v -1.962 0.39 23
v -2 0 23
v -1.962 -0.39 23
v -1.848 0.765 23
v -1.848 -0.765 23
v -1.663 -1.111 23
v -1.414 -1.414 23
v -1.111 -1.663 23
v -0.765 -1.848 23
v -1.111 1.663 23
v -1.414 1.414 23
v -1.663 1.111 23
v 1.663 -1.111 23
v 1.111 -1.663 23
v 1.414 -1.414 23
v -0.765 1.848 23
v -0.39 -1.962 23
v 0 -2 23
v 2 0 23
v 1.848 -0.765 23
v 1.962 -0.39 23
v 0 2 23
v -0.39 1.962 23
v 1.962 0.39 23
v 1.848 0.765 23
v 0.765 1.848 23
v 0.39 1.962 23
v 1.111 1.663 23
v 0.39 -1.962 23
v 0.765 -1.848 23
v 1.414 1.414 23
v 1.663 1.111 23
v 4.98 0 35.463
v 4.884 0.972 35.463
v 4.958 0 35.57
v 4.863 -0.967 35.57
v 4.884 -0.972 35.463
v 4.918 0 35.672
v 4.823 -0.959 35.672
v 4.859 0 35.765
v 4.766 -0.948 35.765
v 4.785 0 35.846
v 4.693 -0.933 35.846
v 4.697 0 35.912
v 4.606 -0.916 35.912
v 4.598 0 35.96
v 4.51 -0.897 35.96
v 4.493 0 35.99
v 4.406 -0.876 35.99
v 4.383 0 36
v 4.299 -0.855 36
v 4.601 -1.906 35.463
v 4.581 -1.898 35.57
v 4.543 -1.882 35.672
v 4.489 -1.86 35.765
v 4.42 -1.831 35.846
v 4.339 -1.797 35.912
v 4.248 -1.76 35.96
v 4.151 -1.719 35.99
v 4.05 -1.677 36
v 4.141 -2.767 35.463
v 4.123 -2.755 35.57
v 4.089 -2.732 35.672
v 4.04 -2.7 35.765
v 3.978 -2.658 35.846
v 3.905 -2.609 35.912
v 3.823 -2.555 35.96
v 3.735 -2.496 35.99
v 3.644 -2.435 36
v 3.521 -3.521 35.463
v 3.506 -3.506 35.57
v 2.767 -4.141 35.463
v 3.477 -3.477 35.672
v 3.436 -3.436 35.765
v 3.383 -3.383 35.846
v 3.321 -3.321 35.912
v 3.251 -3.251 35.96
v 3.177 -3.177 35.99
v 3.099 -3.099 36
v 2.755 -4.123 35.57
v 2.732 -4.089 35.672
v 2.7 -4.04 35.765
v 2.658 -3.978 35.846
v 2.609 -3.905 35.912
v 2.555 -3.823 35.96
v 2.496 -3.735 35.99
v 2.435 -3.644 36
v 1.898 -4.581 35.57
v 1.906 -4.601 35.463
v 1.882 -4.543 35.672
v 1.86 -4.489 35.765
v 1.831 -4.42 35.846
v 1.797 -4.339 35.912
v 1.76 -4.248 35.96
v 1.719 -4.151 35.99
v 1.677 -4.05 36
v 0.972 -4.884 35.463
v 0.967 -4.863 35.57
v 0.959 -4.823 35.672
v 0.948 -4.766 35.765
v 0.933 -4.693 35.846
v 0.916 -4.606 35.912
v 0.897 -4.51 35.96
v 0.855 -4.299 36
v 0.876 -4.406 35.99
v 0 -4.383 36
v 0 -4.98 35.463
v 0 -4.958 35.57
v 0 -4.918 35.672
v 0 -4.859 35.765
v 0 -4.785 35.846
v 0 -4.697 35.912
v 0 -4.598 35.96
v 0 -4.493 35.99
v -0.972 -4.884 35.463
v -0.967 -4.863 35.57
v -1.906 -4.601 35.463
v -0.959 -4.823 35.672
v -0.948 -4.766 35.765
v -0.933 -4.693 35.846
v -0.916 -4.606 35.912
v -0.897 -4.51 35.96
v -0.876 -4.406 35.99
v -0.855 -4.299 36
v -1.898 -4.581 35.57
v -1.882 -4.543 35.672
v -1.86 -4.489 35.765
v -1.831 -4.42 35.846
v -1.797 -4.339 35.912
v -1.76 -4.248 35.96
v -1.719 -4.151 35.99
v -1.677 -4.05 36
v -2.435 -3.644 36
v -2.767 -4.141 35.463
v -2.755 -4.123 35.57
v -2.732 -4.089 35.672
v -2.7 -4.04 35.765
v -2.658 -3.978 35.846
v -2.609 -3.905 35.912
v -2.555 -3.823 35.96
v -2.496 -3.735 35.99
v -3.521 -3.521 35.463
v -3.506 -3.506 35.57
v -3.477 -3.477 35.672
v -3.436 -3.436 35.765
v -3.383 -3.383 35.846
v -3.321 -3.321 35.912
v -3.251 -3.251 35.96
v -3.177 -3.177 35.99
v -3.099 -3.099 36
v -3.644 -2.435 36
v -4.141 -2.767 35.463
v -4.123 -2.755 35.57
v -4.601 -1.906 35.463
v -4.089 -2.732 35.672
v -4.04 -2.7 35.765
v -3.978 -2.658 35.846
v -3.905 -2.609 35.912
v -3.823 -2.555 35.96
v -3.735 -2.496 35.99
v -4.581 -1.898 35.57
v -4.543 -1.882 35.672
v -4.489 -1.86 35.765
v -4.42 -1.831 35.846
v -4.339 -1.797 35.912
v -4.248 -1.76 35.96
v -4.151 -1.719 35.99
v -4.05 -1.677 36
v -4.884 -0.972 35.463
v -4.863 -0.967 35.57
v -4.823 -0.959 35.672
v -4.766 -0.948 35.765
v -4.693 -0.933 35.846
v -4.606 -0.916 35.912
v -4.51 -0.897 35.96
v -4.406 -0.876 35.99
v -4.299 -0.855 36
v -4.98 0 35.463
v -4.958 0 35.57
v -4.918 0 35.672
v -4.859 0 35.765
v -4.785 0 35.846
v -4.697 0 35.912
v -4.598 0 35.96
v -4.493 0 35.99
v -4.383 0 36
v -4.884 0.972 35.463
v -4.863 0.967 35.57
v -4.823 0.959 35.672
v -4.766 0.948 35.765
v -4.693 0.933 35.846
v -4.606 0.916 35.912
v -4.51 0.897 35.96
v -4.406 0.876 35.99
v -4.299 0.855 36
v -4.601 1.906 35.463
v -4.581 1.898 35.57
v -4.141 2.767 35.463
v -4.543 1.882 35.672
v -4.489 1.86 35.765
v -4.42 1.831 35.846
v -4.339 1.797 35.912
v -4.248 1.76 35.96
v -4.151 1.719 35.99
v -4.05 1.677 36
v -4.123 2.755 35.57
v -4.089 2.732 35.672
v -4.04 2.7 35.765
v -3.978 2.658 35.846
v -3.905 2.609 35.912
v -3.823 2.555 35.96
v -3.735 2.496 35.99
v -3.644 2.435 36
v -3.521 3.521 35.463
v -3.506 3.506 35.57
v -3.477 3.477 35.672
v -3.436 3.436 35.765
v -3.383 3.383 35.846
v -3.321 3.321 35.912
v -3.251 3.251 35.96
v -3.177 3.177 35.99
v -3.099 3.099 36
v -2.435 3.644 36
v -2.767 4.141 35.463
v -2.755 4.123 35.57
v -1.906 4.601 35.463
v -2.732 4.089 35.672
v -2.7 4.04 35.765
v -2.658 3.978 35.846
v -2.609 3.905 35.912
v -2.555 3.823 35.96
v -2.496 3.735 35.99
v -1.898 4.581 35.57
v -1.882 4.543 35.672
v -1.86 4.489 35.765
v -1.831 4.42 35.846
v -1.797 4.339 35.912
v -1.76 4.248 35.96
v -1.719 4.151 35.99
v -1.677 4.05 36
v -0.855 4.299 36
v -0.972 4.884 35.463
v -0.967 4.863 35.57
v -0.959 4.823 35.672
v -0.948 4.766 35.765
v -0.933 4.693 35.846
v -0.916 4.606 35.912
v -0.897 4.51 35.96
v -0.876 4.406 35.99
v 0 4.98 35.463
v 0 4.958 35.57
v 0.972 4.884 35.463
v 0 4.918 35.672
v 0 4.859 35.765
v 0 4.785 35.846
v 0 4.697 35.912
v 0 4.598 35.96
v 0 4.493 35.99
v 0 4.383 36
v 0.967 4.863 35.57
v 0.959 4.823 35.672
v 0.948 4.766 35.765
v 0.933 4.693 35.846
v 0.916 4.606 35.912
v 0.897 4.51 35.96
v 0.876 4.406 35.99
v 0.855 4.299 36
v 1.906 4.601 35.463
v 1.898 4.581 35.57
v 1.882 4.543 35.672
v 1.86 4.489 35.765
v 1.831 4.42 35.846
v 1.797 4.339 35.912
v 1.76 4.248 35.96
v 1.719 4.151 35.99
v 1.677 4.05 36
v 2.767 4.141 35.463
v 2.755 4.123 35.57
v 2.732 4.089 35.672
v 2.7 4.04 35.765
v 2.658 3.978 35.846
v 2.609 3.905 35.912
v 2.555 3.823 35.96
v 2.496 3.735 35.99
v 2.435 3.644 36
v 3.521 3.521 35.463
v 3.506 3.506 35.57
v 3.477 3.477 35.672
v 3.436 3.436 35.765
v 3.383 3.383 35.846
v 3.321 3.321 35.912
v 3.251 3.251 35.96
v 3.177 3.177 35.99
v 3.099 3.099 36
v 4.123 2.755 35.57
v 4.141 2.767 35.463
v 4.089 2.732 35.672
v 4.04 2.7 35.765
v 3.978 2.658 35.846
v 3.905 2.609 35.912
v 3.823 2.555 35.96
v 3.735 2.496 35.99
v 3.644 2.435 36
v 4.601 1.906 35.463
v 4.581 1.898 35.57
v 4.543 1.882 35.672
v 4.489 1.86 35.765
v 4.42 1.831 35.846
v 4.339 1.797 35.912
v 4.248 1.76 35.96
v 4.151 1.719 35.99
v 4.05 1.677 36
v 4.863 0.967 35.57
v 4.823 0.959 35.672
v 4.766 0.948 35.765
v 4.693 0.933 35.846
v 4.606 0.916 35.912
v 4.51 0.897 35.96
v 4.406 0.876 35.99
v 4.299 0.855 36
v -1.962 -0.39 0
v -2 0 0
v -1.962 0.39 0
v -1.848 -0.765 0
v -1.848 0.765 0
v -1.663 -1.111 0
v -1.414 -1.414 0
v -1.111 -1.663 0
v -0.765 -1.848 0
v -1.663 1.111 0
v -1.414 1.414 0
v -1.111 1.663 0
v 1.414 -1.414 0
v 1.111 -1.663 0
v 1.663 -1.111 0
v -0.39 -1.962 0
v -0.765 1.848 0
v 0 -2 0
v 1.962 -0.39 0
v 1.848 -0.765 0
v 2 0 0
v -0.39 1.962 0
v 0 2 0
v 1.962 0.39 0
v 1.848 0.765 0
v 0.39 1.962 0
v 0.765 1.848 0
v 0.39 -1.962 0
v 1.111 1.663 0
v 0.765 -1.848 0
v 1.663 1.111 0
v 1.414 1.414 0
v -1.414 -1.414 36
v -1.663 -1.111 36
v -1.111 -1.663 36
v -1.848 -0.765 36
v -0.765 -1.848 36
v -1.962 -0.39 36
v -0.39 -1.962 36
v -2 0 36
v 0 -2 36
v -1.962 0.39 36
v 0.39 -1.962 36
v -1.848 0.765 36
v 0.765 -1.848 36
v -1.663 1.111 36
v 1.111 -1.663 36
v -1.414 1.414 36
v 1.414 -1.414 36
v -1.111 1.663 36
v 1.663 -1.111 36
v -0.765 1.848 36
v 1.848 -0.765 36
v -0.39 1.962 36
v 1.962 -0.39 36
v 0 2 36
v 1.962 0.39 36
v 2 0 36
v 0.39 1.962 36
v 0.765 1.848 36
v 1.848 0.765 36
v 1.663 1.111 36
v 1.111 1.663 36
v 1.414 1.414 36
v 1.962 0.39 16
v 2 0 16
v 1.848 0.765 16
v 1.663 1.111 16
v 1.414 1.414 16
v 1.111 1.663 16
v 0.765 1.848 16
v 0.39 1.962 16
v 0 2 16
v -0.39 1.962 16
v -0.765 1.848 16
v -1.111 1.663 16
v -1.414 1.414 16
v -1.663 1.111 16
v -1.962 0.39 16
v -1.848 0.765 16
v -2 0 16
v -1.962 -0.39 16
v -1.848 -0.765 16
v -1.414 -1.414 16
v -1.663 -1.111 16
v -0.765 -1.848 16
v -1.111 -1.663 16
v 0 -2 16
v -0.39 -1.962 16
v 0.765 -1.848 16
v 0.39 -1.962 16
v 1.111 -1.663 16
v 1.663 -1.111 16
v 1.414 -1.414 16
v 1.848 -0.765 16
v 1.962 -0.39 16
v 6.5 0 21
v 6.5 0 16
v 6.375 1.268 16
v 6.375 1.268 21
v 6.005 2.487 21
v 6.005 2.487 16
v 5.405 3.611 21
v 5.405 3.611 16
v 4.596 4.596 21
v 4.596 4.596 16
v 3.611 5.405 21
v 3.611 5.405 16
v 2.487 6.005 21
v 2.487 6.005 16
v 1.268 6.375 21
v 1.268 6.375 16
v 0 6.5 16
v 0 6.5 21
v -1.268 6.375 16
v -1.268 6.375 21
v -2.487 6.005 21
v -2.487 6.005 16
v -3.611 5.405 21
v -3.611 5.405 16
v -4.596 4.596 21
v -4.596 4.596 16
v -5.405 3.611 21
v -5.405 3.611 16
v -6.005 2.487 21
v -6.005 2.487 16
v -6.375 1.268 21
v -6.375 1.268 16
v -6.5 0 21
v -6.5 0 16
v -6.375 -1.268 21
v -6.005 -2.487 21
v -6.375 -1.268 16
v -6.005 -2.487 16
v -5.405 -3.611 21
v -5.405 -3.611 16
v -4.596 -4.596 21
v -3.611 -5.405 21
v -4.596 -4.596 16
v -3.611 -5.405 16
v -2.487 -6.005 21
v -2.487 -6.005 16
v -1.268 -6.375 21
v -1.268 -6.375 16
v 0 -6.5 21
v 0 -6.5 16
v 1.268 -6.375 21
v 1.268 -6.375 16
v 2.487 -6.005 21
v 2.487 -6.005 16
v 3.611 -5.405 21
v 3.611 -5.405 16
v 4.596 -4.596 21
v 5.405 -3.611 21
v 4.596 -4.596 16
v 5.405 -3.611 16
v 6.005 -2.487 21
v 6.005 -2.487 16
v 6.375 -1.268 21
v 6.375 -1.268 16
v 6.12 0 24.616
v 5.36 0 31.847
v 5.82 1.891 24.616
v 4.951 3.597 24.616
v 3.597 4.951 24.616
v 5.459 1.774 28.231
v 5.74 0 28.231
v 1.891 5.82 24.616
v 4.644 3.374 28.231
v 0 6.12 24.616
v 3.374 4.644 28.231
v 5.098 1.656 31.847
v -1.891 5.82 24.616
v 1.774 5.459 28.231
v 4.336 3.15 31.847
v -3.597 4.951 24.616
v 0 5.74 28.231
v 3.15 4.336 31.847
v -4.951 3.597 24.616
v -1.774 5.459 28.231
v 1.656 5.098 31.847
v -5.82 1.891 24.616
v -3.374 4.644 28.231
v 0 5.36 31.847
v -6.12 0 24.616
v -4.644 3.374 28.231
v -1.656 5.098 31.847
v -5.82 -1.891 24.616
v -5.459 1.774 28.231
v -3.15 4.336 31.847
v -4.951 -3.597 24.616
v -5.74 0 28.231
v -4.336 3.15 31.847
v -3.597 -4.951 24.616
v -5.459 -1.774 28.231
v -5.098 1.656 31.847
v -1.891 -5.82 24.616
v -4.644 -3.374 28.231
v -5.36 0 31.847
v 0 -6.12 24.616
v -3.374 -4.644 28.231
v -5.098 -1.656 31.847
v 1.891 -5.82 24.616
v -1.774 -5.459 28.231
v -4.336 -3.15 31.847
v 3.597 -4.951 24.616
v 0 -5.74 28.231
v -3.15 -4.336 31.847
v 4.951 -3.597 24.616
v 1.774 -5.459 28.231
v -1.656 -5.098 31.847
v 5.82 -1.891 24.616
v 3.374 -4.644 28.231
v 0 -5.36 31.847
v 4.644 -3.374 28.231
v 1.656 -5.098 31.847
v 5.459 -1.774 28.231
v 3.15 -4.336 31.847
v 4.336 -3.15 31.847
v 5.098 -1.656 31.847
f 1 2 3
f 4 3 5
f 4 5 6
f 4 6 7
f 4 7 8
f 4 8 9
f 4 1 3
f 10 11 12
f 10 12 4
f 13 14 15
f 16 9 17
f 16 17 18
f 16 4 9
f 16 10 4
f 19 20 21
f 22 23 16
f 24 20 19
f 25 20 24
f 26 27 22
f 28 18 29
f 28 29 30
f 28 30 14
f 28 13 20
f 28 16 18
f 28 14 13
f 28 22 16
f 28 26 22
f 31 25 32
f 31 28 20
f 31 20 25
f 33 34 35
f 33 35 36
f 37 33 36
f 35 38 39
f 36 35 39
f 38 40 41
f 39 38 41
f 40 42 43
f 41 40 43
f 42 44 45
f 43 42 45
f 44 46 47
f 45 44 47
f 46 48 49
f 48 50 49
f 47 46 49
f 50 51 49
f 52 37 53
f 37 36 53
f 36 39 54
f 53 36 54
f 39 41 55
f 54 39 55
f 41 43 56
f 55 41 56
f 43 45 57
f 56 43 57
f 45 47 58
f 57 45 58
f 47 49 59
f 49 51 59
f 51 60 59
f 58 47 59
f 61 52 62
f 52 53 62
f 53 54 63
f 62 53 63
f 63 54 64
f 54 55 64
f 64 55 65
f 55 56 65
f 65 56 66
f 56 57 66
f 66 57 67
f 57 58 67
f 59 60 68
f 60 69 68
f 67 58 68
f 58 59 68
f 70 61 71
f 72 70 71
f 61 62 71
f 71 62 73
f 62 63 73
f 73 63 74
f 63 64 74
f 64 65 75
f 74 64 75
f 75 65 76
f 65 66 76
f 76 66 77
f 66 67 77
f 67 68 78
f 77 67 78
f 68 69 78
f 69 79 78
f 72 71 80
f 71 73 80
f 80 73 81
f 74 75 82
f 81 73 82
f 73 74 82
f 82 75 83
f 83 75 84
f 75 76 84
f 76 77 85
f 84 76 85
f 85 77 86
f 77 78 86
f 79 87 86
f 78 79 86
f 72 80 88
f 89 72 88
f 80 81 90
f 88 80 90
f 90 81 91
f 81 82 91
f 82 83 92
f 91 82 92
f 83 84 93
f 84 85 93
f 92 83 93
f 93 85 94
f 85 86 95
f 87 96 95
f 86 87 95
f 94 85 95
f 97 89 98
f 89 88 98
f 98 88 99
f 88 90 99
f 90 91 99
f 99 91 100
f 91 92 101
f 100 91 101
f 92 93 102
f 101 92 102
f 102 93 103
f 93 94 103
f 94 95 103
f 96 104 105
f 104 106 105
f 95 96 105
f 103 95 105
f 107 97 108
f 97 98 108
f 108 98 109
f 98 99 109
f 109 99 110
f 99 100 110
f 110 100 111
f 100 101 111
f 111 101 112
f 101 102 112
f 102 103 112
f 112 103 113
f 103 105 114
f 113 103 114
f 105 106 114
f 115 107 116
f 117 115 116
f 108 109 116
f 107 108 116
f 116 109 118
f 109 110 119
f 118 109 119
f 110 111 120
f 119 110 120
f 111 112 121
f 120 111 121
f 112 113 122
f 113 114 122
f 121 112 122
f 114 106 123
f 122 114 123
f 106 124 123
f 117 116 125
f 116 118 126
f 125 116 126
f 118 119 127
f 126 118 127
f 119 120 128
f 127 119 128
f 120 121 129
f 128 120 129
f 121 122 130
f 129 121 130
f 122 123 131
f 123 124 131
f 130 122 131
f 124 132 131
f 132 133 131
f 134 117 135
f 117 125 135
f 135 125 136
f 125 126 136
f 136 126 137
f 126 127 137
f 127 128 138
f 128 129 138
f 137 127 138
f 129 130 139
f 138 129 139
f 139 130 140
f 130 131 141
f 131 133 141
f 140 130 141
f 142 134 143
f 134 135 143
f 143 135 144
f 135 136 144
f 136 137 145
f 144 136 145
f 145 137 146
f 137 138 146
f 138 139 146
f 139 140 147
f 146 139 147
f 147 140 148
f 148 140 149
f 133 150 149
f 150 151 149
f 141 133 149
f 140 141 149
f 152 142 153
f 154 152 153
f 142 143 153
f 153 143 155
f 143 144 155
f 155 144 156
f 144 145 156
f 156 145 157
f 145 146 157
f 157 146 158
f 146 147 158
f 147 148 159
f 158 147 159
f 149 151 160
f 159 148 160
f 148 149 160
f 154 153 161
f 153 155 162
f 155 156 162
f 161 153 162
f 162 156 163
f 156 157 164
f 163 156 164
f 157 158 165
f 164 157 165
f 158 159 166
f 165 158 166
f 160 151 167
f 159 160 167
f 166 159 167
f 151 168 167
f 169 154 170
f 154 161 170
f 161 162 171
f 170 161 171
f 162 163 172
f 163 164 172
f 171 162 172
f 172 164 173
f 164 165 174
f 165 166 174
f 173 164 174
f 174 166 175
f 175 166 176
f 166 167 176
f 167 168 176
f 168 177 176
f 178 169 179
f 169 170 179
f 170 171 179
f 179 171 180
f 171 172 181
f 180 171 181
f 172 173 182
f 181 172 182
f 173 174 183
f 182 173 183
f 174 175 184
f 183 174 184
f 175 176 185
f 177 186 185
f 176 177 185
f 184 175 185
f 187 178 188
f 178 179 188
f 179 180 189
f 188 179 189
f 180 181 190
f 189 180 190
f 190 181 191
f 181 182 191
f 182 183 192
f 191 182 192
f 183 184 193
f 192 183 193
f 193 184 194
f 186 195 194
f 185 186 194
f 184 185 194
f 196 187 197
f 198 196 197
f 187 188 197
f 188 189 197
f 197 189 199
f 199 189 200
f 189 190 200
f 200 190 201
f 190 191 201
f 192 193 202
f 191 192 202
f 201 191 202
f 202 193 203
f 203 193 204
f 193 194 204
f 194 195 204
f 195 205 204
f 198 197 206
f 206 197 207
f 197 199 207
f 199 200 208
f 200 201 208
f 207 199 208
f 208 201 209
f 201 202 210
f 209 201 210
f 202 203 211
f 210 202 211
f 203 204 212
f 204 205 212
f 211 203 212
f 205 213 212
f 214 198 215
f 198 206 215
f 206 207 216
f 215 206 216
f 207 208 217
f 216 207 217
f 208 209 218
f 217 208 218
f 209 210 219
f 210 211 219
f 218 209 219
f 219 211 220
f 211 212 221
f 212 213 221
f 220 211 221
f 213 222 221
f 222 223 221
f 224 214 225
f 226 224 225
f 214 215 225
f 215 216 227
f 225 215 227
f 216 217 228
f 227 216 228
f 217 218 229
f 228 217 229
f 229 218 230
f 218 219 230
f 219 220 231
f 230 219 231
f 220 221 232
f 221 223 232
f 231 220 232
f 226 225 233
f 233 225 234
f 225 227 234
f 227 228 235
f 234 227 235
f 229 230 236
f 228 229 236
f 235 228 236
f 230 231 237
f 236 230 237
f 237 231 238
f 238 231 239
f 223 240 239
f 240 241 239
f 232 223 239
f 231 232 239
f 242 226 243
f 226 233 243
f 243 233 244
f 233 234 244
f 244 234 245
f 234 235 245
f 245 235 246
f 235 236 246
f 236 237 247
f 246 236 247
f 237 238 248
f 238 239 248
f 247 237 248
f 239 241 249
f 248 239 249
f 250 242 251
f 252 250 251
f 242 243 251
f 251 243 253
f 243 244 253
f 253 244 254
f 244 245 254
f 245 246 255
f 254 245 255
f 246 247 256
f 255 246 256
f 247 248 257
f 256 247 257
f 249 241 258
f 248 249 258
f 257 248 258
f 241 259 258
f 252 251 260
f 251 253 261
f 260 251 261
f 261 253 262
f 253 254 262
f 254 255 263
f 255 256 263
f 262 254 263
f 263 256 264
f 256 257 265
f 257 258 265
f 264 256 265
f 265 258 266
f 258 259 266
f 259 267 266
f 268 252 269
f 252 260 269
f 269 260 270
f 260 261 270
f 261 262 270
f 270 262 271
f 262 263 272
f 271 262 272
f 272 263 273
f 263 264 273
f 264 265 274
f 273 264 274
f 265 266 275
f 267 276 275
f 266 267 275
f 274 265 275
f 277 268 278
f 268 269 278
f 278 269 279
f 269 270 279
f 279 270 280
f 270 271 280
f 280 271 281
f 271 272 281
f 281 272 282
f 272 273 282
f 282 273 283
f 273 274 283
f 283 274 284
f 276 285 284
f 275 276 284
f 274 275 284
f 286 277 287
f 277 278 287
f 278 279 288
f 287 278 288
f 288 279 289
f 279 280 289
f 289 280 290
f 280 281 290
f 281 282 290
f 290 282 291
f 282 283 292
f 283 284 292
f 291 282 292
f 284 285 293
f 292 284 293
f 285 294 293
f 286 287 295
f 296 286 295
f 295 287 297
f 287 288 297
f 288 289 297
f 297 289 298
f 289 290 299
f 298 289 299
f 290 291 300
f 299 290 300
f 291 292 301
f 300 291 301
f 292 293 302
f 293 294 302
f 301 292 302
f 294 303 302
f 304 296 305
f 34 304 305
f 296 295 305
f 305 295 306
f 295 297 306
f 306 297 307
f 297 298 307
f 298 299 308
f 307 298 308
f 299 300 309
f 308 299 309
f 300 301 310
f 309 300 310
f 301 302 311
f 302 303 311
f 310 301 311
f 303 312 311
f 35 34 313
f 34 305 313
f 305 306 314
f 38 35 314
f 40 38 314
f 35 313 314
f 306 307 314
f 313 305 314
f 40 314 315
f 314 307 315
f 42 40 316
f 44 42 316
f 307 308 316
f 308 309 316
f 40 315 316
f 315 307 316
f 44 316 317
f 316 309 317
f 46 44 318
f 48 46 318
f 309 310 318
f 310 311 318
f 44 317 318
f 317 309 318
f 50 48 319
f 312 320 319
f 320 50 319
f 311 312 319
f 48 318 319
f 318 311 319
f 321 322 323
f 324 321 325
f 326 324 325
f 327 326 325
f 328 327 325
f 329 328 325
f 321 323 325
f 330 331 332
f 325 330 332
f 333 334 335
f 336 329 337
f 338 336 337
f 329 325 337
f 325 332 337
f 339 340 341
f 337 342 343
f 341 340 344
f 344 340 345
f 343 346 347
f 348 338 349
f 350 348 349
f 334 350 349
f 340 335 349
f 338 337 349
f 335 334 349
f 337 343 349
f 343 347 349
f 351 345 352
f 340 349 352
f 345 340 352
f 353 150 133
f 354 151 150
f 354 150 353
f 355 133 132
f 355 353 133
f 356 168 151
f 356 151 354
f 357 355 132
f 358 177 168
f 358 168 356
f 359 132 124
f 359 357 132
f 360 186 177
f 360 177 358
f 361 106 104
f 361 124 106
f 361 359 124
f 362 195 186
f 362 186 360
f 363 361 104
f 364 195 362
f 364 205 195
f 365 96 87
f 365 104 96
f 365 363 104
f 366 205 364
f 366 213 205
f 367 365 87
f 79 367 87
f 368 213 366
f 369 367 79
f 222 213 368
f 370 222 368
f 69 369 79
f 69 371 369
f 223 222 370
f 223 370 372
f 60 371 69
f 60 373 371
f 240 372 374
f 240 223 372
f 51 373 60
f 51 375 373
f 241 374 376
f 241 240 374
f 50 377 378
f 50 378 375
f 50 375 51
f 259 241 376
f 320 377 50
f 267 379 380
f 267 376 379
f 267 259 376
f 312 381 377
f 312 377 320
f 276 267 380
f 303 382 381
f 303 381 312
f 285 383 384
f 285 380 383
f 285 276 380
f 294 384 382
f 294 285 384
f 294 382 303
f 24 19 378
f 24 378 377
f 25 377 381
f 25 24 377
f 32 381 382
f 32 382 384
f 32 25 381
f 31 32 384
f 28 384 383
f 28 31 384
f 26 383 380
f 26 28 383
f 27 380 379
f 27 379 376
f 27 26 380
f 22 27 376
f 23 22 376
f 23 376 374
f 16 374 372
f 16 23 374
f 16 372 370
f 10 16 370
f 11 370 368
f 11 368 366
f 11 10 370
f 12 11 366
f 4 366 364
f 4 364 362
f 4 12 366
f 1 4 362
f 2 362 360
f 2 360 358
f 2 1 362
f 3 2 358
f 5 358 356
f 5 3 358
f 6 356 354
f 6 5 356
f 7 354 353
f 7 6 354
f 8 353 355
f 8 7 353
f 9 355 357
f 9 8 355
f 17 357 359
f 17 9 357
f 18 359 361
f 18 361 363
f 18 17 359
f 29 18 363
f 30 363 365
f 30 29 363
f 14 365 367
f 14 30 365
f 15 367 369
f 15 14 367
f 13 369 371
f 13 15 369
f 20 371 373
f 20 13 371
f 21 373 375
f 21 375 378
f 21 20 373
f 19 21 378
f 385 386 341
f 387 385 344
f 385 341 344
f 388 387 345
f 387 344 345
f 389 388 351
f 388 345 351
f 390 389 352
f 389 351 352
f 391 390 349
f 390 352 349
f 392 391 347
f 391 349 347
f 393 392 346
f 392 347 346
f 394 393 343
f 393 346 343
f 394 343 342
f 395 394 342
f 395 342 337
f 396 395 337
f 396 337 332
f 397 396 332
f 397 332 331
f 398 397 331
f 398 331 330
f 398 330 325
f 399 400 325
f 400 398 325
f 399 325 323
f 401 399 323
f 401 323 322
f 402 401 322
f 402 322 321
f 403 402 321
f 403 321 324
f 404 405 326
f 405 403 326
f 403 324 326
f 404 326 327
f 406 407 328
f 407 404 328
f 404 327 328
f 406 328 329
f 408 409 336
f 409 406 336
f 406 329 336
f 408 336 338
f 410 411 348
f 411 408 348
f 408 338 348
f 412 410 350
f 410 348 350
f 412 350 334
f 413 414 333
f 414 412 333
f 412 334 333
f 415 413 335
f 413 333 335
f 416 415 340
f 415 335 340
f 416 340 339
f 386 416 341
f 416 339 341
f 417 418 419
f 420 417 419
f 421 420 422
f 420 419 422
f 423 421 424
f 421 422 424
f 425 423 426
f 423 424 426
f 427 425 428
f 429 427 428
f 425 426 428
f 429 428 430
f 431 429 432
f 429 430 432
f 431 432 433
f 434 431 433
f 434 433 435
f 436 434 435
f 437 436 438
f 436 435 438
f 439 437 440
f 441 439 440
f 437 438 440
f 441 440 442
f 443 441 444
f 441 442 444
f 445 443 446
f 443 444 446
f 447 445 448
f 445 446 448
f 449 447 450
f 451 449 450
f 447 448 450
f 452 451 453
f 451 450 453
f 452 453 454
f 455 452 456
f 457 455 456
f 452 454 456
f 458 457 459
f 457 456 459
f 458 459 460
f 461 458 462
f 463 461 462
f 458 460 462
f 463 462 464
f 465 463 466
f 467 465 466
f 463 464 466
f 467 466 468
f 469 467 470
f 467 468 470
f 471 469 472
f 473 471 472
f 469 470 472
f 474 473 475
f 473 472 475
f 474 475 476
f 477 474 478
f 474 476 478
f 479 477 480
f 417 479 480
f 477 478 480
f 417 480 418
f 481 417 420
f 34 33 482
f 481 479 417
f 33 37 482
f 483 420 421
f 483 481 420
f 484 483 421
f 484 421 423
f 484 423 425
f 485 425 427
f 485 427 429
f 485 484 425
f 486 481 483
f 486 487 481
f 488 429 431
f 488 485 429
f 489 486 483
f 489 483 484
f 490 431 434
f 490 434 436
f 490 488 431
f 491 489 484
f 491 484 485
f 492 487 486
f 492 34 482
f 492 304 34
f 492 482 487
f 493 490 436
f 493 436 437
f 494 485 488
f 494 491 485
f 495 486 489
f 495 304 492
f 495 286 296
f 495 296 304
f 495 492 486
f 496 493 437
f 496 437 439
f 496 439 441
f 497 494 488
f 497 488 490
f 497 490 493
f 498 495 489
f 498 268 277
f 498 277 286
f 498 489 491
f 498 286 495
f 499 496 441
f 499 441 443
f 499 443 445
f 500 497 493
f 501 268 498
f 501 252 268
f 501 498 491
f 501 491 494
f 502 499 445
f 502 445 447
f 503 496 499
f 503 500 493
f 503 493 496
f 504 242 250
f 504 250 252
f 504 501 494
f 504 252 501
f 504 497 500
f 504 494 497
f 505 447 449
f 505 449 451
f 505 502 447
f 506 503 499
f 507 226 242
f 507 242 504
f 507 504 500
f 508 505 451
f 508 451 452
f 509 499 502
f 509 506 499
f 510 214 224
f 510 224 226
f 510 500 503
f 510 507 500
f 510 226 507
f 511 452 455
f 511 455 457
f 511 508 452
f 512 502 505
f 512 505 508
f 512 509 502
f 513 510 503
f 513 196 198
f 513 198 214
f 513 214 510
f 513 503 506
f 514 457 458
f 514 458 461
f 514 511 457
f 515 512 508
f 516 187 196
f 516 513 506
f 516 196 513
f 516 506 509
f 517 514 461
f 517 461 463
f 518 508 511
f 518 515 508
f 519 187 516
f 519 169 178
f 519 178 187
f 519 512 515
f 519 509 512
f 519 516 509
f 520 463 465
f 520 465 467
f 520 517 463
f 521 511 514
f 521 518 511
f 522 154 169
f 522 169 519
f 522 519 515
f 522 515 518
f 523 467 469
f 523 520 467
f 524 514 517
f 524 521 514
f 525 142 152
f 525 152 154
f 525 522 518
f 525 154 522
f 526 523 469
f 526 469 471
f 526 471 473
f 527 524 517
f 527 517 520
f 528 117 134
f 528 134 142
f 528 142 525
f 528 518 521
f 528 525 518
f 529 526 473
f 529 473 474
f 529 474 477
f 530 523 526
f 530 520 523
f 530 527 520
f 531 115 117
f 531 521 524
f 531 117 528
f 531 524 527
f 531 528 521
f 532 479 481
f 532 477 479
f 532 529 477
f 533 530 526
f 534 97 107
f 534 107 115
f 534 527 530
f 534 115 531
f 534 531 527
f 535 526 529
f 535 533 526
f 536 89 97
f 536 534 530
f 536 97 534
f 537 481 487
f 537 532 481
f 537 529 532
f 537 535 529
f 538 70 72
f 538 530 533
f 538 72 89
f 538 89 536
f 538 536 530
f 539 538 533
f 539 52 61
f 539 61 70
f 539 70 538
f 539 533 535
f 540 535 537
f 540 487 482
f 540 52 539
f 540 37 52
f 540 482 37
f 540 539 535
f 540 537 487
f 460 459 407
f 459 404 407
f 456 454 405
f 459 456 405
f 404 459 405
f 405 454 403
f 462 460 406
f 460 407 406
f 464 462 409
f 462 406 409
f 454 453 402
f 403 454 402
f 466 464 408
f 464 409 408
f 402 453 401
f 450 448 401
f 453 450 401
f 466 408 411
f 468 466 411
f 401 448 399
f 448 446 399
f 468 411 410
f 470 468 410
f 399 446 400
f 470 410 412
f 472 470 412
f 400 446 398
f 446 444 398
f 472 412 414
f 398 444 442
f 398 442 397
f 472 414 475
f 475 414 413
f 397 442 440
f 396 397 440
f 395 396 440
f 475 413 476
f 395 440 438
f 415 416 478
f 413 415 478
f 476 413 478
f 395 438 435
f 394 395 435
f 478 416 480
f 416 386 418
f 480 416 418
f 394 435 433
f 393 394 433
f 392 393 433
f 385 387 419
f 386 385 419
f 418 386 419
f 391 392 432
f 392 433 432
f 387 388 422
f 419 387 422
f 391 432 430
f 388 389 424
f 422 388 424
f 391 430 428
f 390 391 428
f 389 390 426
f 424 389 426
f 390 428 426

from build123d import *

# Parameters (mm, degrees)
SKETCH_1_R          = 2
EXTRUDE_1_DEPTH     = 36
SKETCH_2_R          = 6.5
EXTRUDE_2_DEPTH     = 5
SKETCH_3_R          = 6.5
EXTRUDE_3_DEPTH     = 15
EXTRUDE_3_TAPER     = 6
CUT_EXTRUDE_START   = -13
SKETCH_4_R          = 2
CUT_EXTRUDE_1_DEPTH = 13
FILLET_1_R          = 0.6


with BuildPart() as part:
    # 草图1 → 凸台-拉伸1 (new body)
    with BuildSketch(Plane.XY):
        Circle(SKETCH_1_R)
    extrude(amount=EXTRUDE_1_DEPTH)

    # 草图2 → 凸台-拉伸2 (add)
    with BuildSketch(Plane.XY.offset(16)):
        Circle(SKETCH_2_R)
    extrude(amount=EXTRUDE_2_DEPTH)

    # 草图3 → 凸台-拉伸3 (add)
    with BuildSketch(Plane.XY.offset(21)):
        Circle(SKETCH_3_R)
    extrude(amount=EXTRUDE_3_DEPTH, taper=EXTRUDE_3_TAPER)

    # 草图4 → 切除-拉伸1 (cut)
    with BuildSketch(Plane.XY.offset(36).offset(CUT_EXTRUDE_START)):
        Circle(SKETCH_4_R)
    extrude(amount=CUT_EXTRUDE_1_DEPTH, mode=Mode.SUBTRACT)

    # 圆角1
    fillet_1_edges = [part.edges().sort_by_distance(p)[0] for p in [
        (-4.923436471, 0, 36),
    ]]
    fillet(fillet_1_edges, radius=FILLET_1_R)


solid = part.part
